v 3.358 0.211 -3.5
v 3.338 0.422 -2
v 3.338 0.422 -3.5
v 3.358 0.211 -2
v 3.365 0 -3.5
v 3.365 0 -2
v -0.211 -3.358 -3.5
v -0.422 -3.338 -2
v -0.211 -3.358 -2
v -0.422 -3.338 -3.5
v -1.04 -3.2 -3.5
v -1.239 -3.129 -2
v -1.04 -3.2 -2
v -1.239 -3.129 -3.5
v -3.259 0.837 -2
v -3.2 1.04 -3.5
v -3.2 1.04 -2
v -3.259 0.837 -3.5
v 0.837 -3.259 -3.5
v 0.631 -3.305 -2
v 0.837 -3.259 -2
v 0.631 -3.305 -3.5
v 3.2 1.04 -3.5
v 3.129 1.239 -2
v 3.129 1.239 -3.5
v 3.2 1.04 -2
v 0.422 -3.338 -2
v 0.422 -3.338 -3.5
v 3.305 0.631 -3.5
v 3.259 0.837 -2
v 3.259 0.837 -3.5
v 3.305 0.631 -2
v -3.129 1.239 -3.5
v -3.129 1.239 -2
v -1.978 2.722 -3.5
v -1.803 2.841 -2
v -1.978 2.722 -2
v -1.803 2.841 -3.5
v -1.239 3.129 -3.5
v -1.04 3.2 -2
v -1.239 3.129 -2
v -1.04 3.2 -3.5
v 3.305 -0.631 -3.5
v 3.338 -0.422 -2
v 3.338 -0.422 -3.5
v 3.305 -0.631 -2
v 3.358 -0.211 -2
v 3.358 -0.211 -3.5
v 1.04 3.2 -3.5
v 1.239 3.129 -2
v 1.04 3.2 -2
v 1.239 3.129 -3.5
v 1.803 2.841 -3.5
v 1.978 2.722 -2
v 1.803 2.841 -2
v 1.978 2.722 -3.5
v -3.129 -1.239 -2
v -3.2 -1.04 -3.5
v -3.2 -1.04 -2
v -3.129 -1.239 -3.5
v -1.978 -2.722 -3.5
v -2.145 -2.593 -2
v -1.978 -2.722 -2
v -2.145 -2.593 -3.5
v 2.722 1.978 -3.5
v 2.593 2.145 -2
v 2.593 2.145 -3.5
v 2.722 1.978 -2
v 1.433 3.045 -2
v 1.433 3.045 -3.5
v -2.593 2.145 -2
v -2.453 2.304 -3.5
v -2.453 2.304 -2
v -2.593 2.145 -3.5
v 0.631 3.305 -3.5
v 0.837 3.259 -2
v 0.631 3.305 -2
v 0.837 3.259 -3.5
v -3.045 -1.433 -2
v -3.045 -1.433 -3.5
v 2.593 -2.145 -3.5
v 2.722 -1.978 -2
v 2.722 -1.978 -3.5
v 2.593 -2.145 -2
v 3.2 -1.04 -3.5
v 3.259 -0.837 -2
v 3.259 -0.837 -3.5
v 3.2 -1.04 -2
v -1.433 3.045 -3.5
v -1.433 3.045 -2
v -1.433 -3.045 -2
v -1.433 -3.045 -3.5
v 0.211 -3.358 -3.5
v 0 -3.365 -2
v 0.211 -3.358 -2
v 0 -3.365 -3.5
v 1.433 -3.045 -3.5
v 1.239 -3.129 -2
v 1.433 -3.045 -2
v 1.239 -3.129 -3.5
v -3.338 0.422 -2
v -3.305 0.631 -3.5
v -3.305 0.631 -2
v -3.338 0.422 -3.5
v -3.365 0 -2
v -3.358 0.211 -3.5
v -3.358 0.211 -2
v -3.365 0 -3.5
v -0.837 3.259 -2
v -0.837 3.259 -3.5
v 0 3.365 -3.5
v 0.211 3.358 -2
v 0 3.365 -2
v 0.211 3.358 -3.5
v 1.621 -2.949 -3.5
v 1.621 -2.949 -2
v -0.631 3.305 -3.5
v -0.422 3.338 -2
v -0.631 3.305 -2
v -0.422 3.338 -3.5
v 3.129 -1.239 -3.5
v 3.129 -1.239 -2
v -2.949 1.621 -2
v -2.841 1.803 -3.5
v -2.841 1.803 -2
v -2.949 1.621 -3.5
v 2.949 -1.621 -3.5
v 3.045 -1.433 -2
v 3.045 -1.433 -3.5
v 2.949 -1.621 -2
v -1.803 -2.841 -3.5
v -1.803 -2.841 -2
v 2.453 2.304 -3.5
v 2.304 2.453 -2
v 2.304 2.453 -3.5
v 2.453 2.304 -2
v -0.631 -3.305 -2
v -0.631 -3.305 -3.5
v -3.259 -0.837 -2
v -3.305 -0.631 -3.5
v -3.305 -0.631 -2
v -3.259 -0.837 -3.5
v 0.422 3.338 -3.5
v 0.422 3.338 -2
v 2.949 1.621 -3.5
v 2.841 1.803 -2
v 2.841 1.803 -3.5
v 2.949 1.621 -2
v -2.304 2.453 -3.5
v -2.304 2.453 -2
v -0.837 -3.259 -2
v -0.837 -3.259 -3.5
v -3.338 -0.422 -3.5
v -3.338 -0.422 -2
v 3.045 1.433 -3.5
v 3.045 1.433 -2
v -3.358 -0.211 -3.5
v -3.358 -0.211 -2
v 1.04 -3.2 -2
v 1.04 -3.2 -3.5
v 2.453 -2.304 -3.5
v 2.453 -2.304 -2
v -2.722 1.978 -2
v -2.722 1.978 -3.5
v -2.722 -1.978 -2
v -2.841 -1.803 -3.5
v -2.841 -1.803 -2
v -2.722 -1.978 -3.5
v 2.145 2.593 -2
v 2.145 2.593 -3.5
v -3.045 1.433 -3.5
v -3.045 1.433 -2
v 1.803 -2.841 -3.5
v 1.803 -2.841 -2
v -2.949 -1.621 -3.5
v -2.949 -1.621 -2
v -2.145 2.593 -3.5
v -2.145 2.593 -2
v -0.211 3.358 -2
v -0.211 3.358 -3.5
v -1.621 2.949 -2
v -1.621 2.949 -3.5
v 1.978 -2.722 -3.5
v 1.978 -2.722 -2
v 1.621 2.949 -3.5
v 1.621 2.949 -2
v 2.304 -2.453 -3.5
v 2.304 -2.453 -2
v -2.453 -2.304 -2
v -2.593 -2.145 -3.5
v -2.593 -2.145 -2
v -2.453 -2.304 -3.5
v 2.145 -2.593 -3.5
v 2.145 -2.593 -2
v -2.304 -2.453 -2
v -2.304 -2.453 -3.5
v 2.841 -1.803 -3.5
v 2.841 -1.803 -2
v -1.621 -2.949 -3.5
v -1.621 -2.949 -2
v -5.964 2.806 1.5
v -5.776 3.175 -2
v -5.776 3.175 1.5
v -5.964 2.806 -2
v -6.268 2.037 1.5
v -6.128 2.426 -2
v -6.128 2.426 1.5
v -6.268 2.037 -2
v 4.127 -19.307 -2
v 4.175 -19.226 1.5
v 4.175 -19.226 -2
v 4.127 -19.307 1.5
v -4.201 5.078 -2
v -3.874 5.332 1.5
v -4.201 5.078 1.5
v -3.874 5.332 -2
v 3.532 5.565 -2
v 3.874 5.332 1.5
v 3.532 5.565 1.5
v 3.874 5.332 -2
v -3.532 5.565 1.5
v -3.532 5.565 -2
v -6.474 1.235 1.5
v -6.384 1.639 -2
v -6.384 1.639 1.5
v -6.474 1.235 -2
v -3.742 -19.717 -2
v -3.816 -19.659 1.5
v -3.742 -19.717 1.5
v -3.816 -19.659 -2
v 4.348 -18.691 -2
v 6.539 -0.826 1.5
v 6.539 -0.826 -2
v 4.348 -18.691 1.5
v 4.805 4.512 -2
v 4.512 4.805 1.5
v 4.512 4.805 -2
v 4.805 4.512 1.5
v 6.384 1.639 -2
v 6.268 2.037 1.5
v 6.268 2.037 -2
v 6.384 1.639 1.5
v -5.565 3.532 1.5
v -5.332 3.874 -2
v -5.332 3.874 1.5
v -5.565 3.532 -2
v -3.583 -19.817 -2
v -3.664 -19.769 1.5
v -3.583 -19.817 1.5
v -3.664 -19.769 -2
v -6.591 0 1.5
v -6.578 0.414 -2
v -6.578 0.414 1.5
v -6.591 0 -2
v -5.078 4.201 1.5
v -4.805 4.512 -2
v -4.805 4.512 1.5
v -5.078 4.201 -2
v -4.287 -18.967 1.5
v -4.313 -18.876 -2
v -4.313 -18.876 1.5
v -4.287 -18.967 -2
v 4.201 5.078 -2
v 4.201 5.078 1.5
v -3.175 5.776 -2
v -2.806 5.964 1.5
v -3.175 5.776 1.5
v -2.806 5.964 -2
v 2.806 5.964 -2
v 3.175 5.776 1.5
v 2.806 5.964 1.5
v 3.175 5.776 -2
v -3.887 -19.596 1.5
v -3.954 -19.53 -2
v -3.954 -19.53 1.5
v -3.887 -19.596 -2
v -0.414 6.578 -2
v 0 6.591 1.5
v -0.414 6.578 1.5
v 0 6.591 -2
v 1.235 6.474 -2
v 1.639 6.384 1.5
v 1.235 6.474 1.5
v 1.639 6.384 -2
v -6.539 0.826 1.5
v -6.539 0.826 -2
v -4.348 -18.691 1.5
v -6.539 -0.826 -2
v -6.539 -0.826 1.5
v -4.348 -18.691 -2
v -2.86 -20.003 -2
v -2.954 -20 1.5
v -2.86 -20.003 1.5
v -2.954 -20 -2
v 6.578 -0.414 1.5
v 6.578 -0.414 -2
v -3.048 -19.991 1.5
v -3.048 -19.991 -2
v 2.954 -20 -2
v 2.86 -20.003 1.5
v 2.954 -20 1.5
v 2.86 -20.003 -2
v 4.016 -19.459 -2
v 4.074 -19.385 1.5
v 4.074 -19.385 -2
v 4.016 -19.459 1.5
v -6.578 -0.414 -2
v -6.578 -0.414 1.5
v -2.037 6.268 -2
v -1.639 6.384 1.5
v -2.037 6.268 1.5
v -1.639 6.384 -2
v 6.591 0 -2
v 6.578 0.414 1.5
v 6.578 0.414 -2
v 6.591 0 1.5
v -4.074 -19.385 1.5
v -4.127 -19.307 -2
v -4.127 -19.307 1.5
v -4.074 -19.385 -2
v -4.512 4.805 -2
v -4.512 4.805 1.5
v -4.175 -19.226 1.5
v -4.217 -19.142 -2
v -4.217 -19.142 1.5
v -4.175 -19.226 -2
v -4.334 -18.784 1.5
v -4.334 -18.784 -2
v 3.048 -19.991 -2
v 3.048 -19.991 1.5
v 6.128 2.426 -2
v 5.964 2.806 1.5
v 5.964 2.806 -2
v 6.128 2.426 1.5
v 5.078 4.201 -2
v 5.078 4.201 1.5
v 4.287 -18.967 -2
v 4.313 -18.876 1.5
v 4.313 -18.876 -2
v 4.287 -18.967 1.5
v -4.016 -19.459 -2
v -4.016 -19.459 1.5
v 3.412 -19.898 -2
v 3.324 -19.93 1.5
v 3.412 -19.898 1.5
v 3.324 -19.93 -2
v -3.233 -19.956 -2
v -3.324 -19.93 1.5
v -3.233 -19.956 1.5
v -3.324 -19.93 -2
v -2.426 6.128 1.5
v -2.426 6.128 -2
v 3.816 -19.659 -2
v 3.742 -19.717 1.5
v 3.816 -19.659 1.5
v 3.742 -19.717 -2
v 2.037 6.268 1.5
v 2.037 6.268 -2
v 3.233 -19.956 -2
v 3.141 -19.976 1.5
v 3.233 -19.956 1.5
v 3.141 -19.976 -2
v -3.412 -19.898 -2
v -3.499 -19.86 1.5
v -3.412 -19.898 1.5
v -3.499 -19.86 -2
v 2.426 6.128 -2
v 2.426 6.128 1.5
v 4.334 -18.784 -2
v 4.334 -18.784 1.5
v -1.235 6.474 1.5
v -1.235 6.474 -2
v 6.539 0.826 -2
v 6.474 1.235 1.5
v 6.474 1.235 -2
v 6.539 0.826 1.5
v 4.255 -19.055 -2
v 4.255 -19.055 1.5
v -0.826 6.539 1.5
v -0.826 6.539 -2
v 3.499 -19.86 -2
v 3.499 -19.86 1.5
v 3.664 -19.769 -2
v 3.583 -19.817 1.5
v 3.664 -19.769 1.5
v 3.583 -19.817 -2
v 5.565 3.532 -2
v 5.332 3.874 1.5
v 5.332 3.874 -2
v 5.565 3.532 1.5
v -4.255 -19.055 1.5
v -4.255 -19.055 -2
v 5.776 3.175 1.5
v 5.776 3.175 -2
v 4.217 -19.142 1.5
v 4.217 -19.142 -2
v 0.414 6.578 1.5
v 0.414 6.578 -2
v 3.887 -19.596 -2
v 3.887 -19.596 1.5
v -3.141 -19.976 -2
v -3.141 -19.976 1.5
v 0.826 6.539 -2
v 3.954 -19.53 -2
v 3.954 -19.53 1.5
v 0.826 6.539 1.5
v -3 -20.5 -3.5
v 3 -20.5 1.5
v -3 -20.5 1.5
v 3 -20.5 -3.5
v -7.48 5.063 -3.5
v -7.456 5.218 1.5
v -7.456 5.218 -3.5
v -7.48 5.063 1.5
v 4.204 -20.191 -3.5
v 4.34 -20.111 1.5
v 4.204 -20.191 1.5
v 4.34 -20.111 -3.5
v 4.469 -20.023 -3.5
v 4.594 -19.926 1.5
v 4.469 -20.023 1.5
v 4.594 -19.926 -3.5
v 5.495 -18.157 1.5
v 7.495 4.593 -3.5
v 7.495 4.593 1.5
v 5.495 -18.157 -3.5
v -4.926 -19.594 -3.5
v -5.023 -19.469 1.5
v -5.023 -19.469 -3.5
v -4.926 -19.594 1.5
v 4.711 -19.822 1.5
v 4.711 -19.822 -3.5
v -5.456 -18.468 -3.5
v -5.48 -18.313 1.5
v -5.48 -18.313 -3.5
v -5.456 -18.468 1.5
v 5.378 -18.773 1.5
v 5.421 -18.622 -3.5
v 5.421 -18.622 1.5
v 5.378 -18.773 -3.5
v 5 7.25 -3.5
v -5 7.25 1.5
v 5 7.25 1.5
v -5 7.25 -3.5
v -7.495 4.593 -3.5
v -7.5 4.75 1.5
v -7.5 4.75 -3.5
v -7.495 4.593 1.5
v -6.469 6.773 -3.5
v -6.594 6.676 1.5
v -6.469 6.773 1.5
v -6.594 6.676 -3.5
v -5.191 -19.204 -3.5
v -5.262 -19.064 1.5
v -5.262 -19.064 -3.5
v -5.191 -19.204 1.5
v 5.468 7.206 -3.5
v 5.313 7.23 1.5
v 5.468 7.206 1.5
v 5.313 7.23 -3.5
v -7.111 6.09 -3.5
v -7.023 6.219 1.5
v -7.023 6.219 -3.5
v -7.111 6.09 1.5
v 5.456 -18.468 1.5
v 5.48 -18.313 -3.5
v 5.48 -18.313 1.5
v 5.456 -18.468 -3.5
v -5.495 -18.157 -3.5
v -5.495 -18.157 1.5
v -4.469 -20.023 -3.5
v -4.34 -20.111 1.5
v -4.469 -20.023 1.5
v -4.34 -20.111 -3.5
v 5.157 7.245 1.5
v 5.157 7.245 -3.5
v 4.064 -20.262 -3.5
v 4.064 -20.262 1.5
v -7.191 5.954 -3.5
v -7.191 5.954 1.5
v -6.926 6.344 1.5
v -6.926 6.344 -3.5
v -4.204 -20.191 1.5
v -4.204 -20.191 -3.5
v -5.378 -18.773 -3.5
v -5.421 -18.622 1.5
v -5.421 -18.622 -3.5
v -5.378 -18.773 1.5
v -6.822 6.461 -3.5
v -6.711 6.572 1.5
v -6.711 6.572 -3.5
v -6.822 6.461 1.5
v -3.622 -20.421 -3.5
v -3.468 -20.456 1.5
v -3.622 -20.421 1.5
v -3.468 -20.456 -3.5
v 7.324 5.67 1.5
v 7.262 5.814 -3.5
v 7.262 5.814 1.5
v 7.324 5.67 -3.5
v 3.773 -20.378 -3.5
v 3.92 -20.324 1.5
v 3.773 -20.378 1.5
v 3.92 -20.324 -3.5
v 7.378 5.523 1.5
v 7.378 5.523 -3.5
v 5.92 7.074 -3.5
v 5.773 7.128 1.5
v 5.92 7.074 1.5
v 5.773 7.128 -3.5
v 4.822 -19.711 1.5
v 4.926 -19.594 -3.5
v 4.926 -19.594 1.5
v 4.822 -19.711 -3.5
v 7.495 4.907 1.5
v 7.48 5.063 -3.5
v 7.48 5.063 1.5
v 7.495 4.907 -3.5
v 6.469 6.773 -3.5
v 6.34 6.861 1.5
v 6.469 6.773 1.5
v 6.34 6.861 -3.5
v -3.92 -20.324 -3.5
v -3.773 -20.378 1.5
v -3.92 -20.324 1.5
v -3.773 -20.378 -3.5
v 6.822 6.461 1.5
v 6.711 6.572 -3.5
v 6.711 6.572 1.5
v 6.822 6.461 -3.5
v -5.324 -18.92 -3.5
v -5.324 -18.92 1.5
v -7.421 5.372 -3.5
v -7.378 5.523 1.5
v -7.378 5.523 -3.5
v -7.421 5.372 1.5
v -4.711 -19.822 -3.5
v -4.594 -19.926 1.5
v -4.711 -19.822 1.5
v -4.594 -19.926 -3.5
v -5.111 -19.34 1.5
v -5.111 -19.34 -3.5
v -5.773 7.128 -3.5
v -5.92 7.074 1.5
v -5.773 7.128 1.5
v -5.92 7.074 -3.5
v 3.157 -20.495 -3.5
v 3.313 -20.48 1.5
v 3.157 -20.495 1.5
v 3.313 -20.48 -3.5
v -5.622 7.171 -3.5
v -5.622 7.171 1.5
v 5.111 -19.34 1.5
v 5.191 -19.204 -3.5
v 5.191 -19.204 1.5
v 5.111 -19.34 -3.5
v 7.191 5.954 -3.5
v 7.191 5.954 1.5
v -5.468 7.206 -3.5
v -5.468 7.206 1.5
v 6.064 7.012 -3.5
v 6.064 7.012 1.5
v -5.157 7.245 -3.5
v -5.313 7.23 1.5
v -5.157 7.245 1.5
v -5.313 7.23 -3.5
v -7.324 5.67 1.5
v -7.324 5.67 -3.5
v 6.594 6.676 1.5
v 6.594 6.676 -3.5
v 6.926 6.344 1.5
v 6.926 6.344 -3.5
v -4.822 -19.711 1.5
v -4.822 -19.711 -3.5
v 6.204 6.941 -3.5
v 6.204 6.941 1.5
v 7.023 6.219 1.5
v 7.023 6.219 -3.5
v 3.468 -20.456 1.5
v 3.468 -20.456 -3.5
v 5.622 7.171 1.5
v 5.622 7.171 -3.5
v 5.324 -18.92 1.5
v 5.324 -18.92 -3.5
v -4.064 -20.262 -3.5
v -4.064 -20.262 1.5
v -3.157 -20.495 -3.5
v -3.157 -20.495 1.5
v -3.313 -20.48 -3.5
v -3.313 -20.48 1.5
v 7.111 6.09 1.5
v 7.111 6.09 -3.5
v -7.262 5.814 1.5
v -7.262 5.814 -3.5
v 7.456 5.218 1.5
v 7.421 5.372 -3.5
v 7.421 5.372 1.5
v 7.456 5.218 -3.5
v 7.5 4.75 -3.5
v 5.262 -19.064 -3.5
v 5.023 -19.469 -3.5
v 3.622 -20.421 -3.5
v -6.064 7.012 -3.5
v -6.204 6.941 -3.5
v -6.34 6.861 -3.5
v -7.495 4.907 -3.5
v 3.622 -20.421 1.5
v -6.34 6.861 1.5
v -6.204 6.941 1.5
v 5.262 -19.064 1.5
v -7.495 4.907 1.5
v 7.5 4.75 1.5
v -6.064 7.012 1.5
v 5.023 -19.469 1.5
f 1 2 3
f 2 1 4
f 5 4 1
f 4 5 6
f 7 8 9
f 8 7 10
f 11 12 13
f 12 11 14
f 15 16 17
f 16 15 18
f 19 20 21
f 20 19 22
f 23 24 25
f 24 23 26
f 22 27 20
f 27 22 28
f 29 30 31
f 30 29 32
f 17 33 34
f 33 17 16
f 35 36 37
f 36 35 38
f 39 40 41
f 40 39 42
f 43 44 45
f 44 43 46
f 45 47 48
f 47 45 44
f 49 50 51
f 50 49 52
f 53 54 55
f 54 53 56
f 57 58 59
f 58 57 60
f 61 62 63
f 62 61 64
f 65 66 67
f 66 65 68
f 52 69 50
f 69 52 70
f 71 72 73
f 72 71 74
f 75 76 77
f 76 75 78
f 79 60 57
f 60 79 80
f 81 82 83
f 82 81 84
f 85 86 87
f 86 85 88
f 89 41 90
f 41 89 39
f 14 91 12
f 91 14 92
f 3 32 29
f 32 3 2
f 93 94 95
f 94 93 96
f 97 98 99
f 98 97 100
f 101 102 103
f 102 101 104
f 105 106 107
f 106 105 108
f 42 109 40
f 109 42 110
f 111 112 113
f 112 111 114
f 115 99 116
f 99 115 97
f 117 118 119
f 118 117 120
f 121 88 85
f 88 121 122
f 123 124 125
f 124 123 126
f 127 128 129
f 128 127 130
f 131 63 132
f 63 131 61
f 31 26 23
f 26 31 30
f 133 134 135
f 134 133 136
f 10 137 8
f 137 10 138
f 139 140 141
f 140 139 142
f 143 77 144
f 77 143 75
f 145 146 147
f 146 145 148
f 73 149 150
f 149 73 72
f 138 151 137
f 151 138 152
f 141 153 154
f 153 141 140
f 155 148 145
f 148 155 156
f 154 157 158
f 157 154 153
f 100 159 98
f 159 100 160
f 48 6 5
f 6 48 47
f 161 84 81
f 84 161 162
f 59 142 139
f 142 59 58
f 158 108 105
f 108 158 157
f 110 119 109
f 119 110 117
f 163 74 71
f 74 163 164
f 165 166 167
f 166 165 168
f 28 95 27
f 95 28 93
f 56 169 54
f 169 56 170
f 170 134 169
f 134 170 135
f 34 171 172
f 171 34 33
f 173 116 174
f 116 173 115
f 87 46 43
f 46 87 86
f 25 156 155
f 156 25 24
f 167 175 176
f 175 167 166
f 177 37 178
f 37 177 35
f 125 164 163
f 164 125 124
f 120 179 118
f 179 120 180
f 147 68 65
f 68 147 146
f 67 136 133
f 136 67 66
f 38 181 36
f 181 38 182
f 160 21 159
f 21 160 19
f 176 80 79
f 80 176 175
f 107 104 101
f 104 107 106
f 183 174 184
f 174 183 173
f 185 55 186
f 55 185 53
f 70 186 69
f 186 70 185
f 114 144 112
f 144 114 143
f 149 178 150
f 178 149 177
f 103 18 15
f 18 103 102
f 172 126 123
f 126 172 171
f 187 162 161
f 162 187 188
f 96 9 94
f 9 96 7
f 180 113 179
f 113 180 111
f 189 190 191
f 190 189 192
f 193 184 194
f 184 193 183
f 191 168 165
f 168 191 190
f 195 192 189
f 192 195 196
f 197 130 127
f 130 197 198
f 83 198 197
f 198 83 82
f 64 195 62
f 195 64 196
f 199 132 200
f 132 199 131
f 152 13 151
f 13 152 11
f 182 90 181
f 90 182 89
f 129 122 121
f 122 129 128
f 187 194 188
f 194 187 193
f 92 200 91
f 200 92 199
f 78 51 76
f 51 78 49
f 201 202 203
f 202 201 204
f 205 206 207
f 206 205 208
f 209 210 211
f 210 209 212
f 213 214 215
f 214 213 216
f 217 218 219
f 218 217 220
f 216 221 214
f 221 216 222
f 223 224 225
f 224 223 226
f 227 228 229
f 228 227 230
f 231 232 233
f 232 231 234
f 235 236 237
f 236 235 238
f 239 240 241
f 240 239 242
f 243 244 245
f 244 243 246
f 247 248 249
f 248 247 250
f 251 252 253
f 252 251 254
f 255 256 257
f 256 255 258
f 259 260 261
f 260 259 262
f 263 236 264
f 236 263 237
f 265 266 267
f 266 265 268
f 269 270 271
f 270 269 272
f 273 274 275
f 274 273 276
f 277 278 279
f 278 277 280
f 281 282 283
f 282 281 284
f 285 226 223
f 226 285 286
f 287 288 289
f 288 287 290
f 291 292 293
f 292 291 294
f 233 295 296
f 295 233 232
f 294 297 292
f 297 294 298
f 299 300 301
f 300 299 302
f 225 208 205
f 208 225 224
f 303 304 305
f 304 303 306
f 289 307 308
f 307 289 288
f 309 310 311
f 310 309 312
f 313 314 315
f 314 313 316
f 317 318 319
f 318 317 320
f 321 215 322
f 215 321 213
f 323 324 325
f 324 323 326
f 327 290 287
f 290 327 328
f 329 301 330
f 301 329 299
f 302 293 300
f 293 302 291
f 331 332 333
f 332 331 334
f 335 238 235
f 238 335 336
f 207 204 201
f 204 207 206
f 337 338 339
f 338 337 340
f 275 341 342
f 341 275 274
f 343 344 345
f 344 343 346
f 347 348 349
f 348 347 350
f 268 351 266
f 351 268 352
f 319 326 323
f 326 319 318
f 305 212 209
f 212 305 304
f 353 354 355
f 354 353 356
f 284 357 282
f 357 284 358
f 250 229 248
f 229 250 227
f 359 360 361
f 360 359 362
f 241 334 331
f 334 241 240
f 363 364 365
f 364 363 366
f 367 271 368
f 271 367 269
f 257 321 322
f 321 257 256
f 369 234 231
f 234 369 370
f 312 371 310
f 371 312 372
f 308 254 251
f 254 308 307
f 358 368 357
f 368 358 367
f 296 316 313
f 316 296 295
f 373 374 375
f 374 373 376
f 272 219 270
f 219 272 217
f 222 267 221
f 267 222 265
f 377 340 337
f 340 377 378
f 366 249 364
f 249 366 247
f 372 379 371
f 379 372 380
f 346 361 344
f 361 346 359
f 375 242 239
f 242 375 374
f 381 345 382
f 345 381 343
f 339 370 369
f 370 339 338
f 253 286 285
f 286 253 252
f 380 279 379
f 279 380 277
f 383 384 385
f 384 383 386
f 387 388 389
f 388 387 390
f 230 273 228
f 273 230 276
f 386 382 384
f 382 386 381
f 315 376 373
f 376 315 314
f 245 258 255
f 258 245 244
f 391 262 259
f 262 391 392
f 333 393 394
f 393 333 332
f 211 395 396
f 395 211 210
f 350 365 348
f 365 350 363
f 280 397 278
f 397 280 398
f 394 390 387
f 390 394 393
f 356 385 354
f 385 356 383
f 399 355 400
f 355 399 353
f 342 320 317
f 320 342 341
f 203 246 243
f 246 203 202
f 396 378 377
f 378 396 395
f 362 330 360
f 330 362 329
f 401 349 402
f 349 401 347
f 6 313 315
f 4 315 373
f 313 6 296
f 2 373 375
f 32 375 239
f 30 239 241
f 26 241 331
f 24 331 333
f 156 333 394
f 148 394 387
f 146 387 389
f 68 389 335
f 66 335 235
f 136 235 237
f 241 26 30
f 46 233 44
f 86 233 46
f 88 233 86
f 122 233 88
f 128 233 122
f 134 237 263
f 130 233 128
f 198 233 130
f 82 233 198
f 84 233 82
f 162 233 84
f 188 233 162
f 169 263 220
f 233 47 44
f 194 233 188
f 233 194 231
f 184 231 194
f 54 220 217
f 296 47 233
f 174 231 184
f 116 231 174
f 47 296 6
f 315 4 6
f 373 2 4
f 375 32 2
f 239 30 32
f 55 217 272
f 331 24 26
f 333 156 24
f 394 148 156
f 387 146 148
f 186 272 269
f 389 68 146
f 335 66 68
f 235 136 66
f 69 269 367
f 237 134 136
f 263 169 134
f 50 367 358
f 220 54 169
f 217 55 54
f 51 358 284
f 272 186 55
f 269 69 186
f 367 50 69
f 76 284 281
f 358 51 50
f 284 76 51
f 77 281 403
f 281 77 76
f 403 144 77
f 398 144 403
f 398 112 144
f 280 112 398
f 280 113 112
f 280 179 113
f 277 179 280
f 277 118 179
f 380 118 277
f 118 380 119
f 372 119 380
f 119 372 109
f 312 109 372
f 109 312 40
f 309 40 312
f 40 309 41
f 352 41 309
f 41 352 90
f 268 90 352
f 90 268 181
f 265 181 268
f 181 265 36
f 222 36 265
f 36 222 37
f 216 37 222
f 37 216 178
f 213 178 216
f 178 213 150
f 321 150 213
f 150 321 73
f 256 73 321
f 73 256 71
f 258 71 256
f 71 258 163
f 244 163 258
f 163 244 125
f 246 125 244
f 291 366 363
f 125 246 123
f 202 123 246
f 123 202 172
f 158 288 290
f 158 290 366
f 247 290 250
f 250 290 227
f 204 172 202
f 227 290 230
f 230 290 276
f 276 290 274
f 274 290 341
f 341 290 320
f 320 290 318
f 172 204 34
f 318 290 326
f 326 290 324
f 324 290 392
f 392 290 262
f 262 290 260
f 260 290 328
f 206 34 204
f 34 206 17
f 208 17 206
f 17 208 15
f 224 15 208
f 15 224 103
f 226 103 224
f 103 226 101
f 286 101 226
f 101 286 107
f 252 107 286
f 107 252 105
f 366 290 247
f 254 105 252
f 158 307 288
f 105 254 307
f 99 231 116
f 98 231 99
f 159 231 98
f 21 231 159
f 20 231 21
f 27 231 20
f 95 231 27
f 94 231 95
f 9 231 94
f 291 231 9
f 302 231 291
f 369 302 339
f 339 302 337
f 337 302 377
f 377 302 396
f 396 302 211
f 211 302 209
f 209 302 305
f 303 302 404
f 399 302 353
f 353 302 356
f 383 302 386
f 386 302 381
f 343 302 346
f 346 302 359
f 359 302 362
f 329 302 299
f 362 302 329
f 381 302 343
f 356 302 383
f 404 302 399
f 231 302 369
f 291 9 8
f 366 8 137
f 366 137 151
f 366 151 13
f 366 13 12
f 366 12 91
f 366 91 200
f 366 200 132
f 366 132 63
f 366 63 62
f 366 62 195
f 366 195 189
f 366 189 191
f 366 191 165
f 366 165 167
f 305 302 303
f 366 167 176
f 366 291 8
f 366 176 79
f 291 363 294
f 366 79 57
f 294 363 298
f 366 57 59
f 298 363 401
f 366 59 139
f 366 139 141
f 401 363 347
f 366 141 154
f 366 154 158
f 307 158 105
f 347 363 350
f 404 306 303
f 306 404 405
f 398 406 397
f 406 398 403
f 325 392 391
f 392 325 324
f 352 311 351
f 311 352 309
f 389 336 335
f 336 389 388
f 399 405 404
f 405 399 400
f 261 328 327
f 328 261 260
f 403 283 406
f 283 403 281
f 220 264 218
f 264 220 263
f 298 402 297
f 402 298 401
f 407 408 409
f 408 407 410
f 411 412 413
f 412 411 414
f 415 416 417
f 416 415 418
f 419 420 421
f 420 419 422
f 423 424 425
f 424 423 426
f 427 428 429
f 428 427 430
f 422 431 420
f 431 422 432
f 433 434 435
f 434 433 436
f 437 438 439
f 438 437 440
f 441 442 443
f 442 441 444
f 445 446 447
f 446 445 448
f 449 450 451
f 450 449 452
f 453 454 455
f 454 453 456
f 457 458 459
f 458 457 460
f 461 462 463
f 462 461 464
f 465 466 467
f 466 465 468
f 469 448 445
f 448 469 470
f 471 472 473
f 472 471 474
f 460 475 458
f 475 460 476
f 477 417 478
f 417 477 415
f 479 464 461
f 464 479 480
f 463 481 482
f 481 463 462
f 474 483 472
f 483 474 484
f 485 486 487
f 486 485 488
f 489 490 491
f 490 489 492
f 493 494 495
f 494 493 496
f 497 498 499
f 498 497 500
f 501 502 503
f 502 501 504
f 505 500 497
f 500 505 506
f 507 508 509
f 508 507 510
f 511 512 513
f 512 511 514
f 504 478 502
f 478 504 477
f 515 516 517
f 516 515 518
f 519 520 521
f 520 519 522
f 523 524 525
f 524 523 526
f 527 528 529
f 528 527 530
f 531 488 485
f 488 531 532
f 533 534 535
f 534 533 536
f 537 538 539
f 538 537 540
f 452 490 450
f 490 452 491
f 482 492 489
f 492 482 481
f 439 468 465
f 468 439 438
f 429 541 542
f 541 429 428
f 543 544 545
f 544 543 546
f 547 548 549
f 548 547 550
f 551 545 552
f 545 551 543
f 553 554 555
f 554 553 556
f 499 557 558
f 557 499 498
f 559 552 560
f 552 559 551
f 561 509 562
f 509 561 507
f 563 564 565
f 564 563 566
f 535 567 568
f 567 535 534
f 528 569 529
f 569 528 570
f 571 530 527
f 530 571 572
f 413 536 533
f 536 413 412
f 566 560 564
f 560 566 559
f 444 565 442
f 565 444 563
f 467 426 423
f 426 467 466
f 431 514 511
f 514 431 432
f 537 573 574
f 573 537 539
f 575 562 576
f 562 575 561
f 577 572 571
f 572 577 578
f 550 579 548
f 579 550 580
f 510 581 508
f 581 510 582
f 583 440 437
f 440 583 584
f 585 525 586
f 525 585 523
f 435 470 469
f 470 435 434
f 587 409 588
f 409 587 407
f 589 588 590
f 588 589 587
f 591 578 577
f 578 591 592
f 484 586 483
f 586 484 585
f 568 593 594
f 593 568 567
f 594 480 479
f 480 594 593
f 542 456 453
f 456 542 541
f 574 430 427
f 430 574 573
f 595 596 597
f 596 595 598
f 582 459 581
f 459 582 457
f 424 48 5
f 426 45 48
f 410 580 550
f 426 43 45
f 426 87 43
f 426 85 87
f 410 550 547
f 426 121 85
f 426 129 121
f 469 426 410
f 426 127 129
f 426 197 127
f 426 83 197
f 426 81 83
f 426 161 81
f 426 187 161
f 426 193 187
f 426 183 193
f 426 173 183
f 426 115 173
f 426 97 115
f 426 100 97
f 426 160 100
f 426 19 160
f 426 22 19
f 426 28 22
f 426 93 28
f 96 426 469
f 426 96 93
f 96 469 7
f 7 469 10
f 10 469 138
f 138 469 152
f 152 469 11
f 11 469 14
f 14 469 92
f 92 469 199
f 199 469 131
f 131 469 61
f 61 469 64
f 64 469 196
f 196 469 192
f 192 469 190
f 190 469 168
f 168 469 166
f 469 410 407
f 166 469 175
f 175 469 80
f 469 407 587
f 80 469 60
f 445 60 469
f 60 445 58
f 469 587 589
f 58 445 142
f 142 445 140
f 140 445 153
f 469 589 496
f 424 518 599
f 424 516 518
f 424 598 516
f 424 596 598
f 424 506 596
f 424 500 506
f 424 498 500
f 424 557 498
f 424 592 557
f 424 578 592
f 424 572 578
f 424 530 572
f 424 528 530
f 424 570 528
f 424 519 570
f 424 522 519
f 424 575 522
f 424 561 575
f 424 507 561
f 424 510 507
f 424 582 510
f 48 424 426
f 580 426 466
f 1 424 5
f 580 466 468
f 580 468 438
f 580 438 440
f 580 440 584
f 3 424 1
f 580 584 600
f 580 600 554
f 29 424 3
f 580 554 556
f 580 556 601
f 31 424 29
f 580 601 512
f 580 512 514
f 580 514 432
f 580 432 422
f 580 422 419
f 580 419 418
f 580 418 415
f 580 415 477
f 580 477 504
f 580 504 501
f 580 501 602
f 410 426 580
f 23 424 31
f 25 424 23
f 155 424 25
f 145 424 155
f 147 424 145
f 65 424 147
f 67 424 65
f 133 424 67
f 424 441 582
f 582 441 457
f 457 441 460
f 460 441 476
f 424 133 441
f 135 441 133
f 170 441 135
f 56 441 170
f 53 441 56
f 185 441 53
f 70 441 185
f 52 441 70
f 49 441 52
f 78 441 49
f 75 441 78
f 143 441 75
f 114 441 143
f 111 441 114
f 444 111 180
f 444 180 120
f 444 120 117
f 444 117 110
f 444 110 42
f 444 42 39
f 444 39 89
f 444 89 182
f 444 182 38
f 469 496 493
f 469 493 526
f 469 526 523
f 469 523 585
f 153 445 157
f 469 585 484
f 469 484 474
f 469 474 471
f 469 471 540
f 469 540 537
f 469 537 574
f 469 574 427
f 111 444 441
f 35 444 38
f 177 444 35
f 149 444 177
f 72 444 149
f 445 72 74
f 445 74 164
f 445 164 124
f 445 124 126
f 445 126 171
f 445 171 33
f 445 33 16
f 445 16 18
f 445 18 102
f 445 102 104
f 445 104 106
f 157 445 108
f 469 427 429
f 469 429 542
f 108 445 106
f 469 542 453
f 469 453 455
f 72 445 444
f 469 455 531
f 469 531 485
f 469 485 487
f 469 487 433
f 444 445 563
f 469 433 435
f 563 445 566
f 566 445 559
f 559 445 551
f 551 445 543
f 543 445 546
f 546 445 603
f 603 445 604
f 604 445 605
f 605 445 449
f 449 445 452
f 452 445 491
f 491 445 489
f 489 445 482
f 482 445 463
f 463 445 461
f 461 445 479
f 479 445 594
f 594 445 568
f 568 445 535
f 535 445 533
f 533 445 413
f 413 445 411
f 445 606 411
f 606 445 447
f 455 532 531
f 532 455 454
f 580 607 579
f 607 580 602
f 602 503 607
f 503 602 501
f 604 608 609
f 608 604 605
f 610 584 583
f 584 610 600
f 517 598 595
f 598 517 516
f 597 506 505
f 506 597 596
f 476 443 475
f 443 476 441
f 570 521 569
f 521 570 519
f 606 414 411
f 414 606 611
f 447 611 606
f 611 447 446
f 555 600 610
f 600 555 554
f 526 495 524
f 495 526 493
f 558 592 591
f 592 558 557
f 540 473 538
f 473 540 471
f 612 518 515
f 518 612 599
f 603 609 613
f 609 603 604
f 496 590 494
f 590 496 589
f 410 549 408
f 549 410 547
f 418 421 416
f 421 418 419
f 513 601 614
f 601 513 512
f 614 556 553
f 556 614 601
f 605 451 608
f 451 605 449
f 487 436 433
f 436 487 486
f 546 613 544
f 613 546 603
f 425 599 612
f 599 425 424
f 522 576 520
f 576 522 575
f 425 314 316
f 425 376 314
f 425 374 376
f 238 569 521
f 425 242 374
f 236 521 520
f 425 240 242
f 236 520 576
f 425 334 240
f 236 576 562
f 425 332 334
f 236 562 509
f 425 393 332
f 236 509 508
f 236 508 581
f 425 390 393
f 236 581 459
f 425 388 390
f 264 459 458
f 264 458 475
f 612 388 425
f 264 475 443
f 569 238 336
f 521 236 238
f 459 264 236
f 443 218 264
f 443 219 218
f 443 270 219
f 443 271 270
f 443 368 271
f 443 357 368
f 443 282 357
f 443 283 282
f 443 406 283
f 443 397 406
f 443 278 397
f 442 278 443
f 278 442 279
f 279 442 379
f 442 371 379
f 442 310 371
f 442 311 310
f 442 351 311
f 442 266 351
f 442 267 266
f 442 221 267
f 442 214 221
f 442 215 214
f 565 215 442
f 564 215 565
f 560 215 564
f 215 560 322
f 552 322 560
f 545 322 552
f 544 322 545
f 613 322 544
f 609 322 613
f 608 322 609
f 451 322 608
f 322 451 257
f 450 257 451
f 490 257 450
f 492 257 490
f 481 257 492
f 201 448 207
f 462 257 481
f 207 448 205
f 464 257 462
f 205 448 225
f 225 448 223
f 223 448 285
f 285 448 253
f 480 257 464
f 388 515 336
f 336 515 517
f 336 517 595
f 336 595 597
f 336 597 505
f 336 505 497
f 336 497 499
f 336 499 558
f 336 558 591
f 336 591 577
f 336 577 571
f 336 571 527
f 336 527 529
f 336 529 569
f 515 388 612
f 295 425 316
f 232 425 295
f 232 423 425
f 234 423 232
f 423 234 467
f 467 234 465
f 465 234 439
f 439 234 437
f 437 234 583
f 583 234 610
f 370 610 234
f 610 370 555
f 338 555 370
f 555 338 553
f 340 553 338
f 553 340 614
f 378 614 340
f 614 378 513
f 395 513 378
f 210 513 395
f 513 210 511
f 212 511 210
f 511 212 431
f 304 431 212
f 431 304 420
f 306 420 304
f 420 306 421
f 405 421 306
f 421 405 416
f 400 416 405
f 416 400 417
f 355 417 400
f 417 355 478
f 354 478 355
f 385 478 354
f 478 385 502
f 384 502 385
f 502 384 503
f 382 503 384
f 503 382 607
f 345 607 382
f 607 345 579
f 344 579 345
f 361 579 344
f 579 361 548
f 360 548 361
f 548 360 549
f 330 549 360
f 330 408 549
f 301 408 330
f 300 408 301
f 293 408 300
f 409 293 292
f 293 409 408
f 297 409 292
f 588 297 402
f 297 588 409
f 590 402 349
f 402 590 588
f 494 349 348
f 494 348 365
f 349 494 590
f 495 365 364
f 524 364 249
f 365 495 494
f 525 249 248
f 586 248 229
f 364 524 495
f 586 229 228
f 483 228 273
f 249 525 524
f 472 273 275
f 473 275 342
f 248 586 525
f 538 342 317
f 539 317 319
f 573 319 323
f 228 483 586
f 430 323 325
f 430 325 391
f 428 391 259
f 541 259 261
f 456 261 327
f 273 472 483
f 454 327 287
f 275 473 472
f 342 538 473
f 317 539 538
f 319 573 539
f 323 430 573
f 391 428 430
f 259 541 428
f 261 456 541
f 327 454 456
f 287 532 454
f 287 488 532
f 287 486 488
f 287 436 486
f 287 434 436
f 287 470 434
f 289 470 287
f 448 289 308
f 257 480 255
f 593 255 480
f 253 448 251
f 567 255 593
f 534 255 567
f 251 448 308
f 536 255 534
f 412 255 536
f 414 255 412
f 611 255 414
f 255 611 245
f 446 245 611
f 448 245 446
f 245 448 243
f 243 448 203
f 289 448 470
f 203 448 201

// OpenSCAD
// file: insertPostive.scad
//CS474 Final Project Module
//Stephen Stucky, Sam Chuks, Josh Pritchett
//Units in MM

//This is the positive of the toothbrush insert
//Subtract this to get a space the insert can fit into

module insertPositive() {
	//center cylinder tab thing-a-majig
	translate([0,0,-2]){
		cylinder(8, r=3.3650, center=true);
	}
	
	hull() {
		hull() {
			translate([2.8602, -18.5030, 0]) {
				cylinder(4, r=1.5, center=true);
			}

			translate([-2.8602, -18.5030, 0]) {
				cylinder(4, r=1.5, center=true);
			}
		}

		cylinder(4, r=6.5910, center=true);
	}
	
} 
// main file
//CS474 3D Printing
//Final Project
//Stephen Stucky, Sam Chuks, Joshua Pritchett

include <insertPostive.scad>

$fn = 100;

module brushSlot() {

difference() {
	hull() {
		hull() {
			translate([5,4.75,-1]) {
				cylinder(5, d=5, center=true);
			}

			translate([-5,4.75,-1]) {
				cylinder(5, d=5, center=true);
			}
		}

		hull() {
			translate([-3,-18,-1]) {
				cylinder(5, d=5, center=true);
			}

			translate([3,-18,-1]) {
				cylinder(5, d=5, center=true);
			}	
		}
	}

	insertPositive();
}




//	difference() {
	//	translate([0,-7,-1]) {
		//	cube([14,28,5], center=true);
		//}

		//translate([6.75,5.75,-3]) {
			//cylinder(6, d=4);
		//}

		//insertPositive();
	//}


}

brushSlot();
